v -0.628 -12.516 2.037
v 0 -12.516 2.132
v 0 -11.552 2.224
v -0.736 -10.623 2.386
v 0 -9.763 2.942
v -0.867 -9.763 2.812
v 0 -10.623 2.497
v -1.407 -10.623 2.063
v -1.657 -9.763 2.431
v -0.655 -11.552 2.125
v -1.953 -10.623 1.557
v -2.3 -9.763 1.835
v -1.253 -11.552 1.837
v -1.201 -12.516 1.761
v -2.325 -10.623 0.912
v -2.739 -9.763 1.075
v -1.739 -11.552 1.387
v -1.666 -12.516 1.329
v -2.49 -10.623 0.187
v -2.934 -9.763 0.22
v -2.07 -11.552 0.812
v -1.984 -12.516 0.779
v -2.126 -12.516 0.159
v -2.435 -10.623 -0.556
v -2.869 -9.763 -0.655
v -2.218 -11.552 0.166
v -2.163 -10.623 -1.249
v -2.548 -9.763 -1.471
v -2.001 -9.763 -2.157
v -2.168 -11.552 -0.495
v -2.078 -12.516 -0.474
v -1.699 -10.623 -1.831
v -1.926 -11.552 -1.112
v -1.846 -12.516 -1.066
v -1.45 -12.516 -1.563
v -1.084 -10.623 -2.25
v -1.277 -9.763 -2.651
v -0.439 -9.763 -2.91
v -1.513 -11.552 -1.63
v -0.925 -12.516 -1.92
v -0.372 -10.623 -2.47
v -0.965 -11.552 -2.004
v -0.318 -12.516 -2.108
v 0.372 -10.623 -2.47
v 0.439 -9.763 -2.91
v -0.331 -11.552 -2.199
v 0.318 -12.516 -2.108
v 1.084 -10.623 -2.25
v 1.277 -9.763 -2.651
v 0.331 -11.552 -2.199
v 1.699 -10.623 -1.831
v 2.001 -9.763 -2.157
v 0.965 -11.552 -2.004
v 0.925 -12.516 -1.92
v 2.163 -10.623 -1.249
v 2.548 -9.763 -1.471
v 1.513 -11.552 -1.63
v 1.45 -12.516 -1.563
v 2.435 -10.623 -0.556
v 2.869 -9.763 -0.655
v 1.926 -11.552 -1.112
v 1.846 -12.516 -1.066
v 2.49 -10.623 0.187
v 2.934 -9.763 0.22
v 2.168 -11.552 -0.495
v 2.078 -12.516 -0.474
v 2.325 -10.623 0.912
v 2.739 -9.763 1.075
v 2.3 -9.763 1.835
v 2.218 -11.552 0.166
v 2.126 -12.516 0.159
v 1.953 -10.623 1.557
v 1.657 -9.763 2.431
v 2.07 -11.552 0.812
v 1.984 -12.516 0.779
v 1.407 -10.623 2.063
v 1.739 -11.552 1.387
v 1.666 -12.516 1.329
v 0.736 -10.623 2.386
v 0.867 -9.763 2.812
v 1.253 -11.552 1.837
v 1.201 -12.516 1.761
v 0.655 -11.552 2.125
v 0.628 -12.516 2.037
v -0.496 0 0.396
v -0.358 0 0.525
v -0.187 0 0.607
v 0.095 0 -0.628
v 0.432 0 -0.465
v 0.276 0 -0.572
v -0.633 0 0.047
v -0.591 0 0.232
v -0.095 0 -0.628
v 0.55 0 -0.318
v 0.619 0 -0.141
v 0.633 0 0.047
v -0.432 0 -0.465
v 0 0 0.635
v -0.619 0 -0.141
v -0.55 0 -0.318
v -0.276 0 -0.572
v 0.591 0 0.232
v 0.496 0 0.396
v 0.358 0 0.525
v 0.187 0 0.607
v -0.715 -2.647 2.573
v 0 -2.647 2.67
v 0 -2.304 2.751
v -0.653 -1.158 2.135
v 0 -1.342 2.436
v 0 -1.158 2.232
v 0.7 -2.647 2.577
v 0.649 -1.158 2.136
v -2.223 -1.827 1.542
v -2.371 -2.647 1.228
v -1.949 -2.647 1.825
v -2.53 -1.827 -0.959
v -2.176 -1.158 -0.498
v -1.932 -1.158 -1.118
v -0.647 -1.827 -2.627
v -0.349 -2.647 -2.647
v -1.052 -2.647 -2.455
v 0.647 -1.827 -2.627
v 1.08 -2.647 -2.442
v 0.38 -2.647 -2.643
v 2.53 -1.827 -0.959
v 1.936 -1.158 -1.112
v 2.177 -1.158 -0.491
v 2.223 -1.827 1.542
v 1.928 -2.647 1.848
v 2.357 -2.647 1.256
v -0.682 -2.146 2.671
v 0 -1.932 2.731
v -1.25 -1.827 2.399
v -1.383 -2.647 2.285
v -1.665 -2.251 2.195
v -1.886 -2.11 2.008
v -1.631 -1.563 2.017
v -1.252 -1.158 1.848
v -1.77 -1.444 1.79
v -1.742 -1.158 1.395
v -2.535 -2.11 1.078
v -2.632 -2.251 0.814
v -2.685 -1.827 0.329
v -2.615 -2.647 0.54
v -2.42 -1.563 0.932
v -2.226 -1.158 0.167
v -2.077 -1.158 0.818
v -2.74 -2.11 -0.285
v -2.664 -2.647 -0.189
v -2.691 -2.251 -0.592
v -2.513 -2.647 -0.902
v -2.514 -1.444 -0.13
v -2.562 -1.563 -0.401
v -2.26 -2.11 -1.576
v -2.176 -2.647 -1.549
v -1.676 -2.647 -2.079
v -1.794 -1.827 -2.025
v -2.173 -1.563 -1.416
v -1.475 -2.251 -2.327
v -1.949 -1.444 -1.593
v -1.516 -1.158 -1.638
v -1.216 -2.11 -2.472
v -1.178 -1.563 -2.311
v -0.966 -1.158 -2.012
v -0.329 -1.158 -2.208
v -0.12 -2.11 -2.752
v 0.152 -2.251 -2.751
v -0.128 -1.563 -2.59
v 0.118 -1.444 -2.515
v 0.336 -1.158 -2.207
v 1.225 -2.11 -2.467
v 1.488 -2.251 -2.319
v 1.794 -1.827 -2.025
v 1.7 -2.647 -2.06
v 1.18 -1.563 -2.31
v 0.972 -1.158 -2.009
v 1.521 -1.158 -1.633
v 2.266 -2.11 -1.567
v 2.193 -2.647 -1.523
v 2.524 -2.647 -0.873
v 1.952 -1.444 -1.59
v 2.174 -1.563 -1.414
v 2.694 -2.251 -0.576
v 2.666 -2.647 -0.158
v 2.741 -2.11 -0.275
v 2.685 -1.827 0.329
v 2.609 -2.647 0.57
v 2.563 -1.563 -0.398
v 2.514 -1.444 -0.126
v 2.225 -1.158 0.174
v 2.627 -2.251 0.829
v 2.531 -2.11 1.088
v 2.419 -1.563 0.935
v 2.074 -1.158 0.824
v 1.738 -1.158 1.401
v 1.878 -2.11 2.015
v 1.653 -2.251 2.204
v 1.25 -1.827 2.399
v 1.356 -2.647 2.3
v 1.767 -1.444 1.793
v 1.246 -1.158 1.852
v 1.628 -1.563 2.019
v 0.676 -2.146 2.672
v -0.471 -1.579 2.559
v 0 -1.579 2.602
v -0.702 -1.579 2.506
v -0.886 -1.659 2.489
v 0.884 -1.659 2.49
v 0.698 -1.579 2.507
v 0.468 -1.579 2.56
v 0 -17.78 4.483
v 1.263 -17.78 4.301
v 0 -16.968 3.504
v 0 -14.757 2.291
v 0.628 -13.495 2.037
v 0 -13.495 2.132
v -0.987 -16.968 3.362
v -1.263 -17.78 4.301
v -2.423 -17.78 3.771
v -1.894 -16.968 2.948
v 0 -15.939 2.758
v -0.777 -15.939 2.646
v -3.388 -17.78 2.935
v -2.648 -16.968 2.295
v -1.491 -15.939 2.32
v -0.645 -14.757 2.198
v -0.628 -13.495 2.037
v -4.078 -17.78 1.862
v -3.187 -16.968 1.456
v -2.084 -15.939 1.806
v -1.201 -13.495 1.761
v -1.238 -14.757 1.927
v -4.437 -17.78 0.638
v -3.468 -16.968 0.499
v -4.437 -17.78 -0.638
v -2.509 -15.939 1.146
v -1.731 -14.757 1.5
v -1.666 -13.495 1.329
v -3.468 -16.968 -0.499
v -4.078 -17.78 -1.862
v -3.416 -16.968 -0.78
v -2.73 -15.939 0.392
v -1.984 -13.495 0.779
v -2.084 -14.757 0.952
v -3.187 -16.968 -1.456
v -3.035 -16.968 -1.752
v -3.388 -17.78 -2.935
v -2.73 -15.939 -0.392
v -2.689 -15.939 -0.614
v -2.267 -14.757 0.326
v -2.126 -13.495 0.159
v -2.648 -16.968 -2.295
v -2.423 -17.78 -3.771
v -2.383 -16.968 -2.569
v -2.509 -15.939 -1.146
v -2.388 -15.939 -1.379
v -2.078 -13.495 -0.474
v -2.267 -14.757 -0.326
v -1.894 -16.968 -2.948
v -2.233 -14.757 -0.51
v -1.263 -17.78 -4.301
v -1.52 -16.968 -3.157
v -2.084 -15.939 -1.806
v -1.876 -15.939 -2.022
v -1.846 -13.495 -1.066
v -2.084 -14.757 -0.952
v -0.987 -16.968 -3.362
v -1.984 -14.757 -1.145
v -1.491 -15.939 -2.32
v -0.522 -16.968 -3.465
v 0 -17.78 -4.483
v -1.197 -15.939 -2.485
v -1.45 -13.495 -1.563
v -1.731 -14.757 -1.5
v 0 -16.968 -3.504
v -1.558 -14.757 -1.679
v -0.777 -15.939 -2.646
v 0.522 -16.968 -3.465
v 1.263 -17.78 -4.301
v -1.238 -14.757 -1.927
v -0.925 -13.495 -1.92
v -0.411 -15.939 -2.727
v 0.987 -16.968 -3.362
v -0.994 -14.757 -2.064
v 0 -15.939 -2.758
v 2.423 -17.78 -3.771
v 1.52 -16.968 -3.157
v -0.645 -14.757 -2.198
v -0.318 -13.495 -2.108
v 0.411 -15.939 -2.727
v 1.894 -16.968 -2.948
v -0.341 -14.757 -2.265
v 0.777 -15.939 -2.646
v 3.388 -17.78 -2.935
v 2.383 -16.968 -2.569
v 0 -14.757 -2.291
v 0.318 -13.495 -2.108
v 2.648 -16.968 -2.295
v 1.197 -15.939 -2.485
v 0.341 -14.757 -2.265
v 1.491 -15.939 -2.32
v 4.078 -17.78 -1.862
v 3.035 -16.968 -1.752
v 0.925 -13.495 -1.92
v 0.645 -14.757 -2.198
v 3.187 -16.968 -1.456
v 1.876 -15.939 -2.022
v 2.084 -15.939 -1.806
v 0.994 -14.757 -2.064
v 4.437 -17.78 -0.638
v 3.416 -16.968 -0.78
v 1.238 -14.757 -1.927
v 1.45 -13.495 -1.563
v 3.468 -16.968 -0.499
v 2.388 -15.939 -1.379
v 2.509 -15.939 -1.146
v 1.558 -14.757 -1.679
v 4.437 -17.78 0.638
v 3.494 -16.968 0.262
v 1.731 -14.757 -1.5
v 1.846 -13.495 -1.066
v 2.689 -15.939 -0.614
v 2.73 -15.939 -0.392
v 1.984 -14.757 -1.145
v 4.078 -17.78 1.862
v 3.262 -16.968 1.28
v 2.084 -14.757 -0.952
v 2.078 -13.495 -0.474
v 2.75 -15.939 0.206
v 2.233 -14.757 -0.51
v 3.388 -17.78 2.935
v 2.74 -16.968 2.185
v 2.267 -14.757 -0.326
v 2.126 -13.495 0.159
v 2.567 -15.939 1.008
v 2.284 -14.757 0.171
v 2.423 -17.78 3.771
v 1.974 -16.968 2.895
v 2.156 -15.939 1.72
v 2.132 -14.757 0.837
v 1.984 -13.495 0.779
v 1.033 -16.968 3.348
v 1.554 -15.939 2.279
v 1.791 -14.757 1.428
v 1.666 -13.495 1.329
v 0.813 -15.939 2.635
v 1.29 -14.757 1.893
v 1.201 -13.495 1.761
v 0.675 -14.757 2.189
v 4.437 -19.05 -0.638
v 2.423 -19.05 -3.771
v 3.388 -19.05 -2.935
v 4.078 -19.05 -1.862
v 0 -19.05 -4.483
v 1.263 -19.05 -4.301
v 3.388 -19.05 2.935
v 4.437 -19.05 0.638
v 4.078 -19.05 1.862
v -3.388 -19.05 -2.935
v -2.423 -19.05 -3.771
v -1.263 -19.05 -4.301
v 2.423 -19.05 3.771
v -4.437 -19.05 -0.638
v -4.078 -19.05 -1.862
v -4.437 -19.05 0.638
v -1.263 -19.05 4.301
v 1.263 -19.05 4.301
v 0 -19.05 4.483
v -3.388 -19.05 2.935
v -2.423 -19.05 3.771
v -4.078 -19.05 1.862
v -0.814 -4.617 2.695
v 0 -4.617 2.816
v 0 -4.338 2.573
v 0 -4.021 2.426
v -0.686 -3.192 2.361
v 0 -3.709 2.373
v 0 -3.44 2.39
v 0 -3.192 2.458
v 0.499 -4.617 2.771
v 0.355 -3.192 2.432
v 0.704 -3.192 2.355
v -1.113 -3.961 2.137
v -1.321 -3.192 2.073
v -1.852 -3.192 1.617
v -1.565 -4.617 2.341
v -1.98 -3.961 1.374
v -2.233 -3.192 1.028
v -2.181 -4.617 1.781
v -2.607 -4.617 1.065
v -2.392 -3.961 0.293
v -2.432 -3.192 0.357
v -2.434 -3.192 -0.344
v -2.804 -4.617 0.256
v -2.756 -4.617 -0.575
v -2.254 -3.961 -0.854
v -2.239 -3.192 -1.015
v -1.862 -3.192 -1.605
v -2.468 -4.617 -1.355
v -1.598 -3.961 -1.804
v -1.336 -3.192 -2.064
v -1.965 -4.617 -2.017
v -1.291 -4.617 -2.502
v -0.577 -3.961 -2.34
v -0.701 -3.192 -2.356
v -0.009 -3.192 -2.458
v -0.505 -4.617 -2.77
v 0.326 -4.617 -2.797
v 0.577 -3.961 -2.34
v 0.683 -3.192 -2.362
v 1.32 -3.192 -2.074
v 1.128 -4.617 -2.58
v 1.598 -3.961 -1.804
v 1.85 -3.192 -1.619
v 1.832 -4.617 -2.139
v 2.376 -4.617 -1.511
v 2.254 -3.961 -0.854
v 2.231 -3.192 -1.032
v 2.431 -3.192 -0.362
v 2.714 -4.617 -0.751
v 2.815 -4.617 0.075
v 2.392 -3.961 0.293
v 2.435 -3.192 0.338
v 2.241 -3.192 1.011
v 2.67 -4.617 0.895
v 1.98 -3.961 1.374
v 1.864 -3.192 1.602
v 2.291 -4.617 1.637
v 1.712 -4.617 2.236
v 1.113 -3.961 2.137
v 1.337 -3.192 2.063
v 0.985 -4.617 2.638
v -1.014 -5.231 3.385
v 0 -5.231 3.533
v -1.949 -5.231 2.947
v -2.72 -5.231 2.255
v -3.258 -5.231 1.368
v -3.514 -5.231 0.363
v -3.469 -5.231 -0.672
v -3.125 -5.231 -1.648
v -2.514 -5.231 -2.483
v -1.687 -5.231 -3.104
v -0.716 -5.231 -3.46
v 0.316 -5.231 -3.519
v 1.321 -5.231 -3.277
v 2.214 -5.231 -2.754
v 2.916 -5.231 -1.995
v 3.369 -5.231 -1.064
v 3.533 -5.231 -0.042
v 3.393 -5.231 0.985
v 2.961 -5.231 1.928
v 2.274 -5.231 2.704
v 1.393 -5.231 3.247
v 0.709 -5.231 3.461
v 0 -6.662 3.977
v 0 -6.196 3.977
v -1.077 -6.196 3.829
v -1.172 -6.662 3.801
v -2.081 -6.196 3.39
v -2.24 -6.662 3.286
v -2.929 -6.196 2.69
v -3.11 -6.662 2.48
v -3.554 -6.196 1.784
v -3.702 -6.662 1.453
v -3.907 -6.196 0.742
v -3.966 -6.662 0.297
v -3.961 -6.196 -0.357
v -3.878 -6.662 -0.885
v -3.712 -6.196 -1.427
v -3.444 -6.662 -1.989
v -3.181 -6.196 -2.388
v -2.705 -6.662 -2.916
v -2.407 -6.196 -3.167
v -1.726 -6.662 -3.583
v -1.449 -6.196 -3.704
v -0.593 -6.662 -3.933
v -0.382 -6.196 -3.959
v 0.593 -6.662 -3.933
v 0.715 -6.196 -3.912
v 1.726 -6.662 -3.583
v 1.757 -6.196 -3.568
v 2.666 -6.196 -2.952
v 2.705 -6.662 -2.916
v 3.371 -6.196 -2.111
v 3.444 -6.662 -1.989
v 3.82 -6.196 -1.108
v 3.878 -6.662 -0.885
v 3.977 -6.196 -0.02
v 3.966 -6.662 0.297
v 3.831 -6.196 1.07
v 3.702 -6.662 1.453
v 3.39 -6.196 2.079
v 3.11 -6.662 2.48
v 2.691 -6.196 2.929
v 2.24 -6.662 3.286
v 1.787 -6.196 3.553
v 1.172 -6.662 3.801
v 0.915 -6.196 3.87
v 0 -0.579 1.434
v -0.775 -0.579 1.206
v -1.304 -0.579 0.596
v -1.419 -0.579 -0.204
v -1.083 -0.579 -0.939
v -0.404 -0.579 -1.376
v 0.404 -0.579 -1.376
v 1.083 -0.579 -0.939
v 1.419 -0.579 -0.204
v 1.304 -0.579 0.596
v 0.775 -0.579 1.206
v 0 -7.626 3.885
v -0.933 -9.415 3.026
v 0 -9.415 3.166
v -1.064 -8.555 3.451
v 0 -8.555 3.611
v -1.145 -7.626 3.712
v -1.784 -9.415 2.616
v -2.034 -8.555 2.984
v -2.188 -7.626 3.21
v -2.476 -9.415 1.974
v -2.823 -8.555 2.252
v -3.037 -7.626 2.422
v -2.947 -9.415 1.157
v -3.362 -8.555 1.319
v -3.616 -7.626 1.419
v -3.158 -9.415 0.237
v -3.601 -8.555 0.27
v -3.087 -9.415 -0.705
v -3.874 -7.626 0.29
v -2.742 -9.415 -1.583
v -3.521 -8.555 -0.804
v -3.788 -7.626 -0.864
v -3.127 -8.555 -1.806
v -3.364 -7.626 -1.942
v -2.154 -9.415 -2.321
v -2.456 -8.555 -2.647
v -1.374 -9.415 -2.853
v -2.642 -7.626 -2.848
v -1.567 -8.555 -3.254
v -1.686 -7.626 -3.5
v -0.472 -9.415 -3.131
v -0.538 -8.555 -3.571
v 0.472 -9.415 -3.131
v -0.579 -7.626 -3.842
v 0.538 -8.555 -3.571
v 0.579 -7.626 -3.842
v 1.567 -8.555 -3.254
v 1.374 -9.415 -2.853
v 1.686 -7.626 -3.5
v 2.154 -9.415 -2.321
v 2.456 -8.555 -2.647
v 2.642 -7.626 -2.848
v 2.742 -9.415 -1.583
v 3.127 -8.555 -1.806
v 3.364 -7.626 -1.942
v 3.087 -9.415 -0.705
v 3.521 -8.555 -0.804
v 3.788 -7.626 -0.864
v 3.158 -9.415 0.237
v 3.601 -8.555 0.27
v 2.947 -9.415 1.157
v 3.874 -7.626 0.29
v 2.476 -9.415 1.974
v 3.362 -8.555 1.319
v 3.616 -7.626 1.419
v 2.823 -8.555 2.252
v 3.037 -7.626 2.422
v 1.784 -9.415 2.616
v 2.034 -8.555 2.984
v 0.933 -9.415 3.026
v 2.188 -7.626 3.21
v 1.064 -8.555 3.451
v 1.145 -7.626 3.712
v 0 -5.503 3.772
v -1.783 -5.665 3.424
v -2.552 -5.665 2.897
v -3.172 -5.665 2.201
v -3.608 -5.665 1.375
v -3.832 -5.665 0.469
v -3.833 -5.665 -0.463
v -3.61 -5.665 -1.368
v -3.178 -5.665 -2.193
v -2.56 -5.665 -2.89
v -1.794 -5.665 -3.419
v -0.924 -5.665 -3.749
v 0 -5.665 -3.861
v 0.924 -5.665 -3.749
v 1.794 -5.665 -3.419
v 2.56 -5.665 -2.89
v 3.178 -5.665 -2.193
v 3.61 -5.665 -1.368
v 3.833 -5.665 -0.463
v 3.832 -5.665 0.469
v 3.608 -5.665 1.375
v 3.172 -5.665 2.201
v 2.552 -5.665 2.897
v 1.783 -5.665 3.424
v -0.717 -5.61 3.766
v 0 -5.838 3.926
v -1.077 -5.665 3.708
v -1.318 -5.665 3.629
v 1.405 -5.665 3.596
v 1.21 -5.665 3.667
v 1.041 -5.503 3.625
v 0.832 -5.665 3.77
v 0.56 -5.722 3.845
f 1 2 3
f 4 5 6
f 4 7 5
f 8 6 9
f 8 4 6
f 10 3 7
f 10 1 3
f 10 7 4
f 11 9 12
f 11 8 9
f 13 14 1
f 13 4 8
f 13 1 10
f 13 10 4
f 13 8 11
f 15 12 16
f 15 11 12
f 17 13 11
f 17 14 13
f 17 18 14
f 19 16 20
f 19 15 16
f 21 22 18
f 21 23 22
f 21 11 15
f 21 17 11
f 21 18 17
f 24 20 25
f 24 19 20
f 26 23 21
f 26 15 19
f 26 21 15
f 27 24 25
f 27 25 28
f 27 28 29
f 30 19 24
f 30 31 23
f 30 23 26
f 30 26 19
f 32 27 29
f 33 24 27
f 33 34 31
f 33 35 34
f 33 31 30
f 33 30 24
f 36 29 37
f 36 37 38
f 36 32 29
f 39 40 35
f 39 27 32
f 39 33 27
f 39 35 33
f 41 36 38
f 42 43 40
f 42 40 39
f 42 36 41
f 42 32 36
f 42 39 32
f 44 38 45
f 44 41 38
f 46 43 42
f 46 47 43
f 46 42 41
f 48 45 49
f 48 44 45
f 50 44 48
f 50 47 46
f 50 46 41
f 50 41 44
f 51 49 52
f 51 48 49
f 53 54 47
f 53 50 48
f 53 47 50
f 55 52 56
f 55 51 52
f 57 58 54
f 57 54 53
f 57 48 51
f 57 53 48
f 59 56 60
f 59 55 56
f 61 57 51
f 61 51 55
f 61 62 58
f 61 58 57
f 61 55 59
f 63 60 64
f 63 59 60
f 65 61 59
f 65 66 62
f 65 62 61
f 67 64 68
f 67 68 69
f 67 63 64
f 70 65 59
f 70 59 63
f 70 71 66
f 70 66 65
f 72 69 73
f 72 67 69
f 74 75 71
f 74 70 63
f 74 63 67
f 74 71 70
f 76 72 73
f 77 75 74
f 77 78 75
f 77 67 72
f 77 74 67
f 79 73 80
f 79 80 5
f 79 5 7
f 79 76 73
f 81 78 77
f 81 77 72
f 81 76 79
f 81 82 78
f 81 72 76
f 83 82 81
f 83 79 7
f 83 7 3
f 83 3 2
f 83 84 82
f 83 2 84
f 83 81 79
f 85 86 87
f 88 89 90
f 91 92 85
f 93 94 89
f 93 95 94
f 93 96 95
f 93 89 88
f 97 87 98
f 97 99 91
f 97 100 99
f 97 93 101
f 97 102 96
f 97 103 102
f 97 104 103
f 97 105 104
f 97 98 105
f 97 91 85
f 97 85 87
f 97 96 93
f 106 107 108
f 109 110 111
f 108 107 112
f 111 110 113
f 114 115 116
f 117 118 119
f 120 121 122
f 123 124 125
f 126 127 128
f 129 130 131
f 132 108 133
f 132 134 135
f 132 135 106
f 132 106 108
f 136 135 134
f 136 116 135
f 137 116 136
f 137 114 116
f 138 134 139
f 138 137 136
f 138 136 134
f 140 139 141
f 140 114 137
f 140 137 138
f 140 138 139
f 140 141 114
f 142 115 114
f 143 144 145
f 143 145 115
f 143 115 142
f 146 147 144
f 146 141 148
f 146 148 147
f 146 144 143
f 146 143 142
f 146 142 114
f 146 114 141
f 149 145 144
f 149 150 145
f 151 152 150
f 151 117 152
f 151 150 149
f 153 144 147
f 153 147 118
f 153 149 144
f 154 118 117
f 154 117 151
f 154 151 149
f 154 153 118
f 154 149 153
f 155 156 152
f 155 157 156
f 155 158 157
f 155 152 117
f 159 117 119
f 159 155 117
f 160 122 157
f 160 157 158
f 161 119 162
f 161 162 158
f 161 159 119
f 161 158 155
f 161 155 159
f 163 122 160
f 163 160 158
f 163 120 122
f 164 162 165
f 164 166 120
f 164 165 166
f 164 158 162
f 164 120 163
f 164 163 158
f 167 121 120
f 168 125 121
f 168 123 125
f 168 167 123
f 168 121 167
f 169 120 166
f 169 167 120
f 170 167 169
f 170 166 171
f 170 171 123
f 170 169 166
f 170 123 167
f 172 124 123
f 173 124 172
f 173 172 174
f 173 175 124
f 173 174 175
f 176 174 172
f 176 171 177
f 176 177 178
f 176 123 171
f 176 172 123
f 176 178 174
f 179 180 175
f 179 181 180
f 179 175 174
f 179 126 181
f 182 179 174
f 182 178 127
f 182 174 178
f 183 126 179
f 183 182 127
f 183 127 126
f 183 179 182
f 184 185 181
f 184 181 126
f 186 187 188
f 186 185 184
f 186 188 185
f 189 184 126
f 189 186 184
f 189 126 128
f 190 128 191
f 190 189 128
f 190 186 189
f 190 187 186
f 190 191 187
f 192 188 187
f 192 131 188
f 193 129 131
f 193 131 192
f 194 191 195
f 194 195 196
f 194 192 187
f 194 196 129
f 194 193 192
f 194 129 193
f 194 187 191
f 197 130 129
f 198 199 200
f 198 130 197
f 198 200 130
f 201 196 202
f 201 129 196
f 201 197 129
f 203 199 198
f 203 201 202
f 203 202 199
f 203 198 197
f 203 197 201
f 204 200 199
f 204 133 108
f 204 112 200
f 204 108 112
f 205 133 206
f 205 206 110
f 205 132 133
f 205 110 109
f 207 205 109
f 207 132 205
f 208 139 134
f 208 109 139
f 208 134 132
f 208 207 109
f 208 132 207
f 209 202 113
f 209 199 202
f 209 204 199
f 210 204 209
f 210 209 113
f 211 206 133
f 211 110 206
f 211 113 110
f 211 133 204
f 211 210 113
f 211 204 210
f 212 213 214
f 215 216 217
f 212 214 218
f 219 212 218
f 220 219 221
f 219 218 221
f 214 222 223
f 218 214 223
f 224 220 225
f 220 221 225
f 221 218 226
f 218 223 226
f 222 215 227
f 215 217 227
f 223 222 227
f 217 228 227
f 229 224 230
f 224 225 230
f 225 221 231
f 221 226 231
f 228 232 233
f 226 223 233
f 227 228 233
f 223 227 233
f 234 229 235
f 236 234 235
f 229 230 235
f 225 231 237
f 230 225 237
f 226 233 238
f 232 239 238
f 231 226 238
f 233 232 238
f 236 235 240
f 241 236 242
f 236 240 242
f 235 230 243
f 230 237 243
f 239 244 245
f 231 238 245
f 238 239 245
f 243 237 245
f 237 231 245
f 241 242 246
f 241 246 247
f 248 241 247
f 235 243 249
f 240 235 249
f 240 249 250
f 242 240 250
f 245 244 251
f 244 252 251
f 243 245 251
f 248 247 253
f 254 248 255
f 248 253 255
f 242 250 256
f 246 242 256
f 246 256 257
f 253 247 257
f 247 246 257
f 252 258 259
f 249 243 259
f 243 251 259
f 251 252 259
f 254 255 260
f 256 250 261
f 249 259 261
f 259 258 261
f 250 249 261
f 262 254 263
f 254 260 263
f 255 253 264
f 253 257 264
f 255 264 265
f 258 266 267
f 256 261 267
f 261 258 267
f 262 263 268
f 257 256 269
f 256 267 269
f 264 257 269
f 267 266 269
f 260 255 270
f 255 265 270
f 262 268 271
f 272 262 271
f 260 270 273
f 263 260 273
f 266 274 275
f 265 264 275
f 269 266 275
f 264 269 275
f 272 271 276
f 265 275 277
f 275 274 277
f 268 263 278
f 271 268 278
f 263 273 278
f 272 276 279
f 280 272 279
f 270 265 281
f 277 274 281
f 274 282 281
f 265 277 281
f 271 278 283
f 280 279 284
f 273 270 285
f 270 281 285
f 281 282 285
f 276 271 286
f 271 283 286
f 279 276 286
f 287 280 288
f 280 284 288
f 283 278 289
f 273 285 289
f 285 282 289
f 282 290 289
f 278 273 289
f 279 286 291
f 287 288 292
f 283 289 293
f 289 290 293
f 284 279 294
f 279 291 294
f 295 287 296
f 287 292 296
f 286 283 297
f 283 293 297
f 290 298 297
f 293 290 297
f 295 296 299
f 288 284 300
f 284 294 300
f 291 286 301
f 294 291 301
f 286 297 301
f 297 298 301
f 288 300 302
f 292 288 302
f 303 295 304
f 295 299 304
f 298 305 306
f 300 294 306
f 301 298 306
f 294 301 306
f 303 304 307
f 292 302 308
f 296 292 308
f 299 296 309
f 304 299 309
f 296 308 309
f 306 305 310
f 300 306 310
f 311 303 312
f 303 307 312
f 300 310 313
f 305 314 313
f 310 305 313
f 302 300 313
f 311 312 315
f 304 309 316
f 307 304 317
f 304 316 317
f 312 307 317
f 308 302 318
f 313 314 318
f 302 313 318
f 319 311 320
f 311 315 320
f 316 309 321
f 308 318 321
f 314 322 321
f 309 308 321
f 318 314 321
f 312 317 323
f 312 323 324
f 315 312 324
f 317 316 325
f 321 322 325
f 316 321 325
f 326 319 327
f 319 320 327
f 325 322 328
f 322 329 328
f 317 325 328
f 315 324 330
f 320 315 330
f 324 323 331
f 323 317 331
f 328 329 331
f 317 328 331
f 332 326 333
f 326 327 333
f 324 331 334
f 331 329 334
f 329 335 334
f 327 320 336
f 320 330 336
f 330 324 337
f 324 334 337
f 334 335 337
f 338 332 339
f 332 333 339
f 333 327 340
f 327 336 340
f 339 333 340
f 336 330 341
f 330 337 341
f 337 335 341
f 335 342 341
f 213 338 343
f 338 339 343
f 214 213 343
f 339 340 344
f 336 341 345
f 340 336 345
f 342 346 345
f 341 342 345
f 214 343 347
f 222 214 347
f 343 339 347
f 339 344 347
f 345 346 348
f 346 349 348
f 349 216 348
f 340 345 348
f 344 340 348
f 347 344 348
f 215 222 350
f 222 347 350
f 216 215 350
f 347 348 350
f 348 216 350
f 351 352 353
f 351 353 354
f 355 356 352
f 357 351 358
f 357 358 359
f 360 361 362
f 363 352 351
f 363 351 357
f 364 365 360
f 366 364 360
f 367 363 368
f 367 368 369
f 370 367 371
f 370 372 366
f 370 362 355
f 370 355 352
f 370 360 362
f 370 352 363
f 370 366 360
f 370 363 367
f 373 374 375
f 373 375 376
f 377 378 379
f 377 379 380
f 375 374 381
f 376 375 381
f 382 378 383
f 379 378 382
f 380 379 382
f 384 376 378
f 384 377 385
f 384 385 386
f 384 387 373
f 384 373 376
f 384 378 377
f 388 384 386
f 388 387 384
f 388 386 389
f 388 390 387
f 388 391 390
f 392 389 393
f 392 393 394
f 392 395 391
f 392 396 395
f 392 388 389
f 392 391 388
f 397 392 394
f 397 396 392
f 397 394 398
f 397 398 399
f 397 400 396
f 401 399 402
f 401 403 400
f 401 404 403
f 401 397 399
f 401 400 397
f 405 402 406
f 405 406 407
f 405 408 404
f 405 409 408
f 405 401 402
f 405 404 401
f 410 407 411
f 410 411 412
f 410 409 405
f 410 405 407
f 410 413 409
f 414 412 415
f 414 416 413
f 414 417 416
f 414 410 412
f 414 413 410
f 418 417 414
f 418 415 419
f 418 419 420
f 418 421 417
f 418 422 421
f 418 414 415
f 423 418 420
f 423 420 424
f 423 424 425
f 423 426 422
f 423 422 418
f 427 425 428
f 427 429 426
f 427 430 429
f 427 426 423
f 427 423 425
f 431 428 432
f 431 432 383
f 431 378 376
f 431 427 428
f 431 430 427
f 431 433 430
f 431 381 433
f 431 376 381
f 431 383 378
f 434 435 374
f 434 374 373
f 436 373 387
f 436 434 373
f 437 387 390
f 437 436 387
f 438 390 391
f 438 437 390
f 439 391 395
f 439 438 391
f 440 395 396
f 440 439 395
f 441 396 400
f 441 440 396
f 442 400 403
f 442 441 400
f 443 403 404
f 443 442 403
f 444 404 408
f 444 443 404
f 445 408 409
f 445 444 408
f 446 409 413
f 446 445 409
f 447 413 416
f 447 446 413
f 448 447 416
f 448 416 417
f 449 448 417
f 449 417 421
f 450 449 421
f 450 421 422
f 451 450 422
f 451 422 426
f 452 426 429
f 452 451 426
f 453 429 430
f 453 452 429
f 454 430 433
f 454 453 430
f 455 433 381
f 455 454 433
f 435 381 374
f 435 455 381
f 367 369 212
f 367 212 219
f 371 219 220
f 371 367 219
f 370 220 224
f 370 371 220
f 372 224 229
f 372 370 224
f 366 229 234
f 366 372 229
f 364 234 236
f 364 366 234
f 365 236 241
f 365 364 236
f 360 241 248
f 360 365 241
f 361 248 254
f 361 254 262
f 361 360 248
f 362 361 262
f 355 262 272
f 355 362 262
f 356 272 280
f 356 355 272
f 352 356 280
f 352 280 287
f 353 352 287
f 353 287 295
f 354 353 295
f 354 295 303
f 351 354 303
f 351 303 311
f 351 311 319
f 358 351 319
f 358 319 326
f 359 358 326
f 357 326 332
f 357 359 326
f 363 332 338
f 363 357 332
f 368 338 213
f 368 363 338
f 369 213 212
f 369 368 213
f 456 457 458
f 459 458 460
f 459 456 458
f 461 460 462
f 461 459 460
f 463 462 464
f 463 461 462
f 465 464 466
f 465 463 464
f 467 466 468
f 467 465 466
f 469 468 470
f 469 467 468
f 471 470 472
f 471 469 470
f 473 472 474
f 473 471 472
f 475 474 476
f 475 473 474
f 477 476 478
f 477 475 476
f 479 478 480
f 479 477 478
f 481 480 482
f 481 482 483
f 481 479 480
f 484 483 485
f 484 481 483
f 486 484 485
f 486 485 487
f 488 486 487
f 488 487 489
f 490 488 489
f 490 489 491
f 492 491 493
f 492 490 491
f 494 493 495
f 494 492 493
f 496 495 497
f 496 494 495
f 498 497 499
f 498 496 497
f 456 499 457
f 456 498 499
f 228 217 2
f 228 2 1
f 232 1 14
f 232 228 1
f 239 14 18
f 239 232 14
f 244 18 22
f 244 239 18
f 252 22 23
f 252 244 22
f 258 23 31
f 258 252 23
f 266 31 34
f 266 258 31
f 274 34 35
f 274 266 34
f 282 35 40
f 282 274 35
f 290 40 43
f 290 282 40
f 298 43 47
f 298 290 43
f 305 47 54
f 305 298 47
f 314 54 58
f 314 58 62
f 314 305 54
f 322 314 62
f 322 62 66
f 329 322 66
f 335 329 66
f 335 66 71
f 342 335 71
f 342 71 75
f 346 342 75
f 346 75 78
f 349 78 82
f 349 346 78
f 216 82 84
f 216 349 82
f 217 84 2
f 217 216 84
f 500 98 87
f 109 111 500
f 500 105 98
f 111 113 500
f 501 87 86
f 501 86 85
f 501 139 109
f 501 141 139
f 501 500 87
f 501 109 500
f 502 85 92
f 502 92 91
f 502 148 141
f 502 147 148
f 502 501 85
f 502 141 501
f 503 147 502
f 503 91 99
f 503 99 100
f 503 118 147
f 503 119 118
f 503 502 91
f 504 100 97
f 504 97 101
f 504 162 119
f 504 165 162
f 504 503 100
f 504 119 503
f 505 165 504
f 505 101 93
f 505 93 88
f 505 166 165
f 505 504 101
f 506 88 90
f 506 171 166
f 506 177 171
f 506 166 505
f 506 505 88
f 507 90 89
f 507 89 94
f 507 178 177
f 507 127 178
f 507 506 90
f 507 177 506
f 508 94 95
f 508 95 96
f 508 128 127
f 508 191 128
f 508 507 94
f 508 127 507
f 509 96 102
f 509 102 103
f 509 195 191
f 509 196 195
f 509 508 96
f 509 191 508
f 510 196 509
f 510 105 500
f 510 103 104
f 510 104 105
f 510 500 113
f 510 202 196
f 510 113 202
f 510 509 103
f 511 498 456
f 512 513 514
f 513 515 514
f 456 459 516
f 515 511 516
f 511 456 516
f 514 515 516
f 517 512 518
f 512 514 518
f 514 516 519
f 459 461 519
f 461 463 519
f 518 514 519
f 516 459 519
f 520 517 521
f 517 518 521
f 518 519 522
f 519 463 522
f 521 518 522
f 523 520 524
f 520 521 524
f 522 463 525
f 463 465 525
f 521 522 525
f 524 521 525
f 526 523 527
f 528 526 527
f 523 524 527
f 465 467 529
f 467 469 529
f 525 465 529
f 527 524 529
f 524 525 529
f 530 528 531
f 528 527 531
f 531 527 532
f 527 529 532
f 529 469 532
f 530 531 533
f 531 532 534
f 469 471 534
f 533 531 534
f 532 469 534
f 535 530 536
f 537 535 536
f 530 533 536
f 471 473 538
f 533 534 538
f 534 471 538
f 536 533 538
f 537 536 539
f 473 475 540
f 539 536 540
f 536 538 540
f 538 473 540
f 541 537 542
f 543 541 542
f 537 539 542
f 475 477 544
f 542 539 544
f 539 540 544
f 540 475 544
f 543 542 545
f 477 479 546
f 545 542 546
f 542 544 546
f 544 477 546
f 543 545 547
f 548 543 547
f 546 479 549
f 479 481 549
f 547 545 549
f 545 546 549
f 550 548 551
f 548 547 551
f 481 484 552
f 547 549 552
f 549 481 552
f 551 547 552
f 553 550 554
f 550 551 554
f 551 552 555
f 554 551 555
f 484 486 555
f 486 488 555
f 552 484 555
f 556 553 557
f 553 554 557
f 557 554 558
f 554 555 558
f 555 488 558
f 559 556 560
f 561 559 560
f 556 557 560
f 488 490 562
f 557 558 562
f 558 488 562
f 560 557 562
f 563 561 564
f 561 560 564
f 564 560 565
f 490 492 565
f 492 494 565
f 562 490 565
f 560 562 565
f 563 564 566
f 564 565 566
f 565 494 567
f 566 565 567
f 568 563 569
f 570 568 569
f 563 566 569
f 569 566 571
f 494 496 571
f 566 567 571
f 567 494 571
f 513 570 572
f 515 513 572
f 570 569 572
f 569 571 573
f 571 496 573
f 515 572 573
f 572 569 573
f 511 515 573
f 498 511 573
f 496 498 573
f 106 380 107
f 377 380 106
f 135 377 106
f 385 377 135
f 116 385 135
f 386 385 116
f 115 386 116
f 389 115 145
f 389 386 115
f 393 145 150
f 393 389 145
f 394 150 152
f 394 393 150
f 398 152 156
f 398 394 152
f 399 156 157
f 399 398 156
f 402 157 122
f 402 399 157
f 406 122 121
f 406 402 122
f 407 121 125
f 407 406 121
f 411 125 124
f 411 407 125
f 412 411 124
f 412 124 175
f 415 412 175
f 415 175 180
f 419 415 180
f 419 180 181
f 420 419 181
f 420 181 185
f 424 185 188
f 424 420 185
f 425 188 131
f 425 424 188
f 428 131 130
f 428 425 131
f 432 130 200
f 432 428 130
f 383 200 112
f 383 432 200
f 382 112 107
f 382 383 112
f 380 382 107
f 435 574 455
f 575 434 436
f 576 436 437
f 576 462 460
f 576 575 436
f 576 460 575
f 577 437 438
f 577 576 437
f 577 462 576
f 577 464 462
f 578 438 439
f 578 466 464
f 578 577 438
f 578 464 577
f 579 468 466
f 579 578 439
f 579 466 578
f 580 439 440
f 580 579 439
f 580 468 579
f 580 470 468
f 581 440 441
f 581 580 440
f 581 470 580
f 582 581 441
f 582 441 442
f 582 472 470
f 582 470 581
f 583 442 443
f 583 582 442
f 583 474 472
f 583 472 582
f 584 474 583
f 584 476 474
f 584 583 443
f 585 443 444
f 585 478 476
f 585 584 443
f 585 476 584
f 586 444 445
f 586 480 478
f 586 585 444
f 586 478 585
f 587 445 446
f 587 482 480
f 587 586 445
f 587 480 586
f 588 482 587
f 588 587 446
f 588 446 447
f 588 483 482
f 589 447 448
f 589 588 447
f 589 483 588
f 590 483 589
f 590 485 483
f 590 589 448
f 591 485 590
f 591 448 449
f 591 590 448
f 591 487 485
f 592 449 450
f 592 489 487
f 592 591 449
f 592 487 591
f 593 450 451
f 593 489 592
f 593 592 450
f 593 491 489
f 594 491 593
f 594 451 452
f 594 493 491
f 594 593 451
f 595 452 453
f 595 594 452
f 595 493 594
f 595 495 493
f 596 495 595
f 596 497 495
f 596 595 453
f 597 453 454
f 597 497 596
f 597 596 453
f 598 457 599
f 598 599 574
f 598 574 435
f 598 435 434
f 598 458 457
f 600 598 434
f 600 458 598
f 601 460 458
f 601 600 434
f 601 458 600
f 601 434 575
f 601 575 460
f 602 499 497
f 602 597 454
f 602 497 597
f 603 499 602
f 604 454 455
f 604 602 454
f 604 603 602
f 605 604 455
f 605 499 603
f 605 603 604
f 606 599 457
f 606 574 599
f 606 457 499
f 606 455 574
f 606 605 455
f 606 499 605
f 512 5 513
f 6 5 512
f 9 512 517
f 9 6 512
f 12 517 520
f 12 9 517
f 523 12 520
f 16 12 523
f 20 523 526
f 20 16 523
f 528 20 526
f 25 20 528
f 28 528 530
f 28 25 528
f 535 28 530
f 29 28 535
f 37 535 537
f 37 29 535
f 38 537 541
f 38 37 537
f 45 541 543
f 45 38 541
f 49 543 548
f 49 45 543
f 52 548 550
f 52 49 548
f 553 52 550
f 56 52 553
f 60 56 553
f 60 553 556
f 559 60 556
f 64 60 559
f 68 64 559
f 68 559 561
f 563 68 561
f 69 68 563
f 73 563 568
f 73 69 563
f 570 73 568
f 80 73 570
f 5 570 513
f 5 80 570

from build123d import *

# Parameters (mm, degrees)
F3_R = 1.27


# Not quite as in the source:
# - a fillet or chamfer that OpenCascade refuses, or shapes differently, is made with other operations: its cross-section is extruded or revolved along the edge and cut away or added


with BuildPart() as f1:
    # F0 (on Right) → F1 (revolve)
    with BuildSketch(Plane.YZ):
        Polygon((-19.05, 0), (0, 0), (0, 0.635), (-1.7329187831, 3.0259732157), (-4.0311289486, 2.1315128542), (-5.611469965, 3.9772258134), (-8.1580255717, 3.9772258134), (-11.0198768943, 2.1315128542), (-17.4555711955, 2.1315128542), (-17.78, 4.4826099296), (-19.05, 4.4826099296), align=None)
    revolve(axis=Axis((0, -9.525, 0), (0, -1, 0)))

    # F2: fillet of radius 5.08 on 3 edges, made by hand

    # F2_s1 → F2_t2 (revolve)
    with BuildSketch(Plane.YZ):
        with BuildLine():
            ThreePointArc((-9.7626119553, 2.94236916), (-11.0808174663, 2.3384414426), (-12.5159394181, 2.1315128542))
            Line((-12.5159394181, 2.1315128542), (-11.0198768943, 2.1315128542))
            Line((-11.0198768943, 2.1315128542), (-9.7626119553, 2.94236916))
        make_face()
    revolve(axis=Axis((0, -11.0198768943, 0), (0, -1, 0)))

    # F2_s3 → F2_t4 (revolve, cut)
    with BuildSketch(Plane.YZ):
        with BuildLine():
            ThreePointArc((-9.4152905107, 3.1663695077), (-8.0970849997, 3.7702972251), (-6.6619630479, 3.9772258134))
            Line((-6.6619630479, 3.9772258134), (-8.1580255717, 3.9772258134))
            Line((-8.1580255717, 3.9772258134), (-9.4152905107, 3.1663695077))
        make_face()
    revolve(axis=Axis((0, -8.1580255717, 0), (0, -1, 0)), mode=Mode.SUBTRACT)

    # F2_s5 → F2_t6 (revolve)
    with BuildSketch(Plane.YZ):
        with BuildLine():
            ThreePointArc((-17.78, 4.4826099296), (-15.9389265067, 2.7579060655), (-13.495202592, 2.1315128542))
            Line((-13.495202592, 2.1315128542), (-17.4555711955, 2.1315128542))
            Line((-17.4555711955, 2.1315128542), (-17.78, 4.4826099296))
        make_face()
    revolve(axis=Axis((0, -17.4555711955, 0), (0, -1, 0)))

    # F3
    f3_edges = [f1.edges().sort_by_distance(p)[0] for p in [
        (0, -5.61147, -3.977226),
        (0, -4.031129, -2.131513),
        (0, -1.732919, -3.025973),
    ]]
    fillet(f3_edges, radius=F3_R)


solid = f1.part
